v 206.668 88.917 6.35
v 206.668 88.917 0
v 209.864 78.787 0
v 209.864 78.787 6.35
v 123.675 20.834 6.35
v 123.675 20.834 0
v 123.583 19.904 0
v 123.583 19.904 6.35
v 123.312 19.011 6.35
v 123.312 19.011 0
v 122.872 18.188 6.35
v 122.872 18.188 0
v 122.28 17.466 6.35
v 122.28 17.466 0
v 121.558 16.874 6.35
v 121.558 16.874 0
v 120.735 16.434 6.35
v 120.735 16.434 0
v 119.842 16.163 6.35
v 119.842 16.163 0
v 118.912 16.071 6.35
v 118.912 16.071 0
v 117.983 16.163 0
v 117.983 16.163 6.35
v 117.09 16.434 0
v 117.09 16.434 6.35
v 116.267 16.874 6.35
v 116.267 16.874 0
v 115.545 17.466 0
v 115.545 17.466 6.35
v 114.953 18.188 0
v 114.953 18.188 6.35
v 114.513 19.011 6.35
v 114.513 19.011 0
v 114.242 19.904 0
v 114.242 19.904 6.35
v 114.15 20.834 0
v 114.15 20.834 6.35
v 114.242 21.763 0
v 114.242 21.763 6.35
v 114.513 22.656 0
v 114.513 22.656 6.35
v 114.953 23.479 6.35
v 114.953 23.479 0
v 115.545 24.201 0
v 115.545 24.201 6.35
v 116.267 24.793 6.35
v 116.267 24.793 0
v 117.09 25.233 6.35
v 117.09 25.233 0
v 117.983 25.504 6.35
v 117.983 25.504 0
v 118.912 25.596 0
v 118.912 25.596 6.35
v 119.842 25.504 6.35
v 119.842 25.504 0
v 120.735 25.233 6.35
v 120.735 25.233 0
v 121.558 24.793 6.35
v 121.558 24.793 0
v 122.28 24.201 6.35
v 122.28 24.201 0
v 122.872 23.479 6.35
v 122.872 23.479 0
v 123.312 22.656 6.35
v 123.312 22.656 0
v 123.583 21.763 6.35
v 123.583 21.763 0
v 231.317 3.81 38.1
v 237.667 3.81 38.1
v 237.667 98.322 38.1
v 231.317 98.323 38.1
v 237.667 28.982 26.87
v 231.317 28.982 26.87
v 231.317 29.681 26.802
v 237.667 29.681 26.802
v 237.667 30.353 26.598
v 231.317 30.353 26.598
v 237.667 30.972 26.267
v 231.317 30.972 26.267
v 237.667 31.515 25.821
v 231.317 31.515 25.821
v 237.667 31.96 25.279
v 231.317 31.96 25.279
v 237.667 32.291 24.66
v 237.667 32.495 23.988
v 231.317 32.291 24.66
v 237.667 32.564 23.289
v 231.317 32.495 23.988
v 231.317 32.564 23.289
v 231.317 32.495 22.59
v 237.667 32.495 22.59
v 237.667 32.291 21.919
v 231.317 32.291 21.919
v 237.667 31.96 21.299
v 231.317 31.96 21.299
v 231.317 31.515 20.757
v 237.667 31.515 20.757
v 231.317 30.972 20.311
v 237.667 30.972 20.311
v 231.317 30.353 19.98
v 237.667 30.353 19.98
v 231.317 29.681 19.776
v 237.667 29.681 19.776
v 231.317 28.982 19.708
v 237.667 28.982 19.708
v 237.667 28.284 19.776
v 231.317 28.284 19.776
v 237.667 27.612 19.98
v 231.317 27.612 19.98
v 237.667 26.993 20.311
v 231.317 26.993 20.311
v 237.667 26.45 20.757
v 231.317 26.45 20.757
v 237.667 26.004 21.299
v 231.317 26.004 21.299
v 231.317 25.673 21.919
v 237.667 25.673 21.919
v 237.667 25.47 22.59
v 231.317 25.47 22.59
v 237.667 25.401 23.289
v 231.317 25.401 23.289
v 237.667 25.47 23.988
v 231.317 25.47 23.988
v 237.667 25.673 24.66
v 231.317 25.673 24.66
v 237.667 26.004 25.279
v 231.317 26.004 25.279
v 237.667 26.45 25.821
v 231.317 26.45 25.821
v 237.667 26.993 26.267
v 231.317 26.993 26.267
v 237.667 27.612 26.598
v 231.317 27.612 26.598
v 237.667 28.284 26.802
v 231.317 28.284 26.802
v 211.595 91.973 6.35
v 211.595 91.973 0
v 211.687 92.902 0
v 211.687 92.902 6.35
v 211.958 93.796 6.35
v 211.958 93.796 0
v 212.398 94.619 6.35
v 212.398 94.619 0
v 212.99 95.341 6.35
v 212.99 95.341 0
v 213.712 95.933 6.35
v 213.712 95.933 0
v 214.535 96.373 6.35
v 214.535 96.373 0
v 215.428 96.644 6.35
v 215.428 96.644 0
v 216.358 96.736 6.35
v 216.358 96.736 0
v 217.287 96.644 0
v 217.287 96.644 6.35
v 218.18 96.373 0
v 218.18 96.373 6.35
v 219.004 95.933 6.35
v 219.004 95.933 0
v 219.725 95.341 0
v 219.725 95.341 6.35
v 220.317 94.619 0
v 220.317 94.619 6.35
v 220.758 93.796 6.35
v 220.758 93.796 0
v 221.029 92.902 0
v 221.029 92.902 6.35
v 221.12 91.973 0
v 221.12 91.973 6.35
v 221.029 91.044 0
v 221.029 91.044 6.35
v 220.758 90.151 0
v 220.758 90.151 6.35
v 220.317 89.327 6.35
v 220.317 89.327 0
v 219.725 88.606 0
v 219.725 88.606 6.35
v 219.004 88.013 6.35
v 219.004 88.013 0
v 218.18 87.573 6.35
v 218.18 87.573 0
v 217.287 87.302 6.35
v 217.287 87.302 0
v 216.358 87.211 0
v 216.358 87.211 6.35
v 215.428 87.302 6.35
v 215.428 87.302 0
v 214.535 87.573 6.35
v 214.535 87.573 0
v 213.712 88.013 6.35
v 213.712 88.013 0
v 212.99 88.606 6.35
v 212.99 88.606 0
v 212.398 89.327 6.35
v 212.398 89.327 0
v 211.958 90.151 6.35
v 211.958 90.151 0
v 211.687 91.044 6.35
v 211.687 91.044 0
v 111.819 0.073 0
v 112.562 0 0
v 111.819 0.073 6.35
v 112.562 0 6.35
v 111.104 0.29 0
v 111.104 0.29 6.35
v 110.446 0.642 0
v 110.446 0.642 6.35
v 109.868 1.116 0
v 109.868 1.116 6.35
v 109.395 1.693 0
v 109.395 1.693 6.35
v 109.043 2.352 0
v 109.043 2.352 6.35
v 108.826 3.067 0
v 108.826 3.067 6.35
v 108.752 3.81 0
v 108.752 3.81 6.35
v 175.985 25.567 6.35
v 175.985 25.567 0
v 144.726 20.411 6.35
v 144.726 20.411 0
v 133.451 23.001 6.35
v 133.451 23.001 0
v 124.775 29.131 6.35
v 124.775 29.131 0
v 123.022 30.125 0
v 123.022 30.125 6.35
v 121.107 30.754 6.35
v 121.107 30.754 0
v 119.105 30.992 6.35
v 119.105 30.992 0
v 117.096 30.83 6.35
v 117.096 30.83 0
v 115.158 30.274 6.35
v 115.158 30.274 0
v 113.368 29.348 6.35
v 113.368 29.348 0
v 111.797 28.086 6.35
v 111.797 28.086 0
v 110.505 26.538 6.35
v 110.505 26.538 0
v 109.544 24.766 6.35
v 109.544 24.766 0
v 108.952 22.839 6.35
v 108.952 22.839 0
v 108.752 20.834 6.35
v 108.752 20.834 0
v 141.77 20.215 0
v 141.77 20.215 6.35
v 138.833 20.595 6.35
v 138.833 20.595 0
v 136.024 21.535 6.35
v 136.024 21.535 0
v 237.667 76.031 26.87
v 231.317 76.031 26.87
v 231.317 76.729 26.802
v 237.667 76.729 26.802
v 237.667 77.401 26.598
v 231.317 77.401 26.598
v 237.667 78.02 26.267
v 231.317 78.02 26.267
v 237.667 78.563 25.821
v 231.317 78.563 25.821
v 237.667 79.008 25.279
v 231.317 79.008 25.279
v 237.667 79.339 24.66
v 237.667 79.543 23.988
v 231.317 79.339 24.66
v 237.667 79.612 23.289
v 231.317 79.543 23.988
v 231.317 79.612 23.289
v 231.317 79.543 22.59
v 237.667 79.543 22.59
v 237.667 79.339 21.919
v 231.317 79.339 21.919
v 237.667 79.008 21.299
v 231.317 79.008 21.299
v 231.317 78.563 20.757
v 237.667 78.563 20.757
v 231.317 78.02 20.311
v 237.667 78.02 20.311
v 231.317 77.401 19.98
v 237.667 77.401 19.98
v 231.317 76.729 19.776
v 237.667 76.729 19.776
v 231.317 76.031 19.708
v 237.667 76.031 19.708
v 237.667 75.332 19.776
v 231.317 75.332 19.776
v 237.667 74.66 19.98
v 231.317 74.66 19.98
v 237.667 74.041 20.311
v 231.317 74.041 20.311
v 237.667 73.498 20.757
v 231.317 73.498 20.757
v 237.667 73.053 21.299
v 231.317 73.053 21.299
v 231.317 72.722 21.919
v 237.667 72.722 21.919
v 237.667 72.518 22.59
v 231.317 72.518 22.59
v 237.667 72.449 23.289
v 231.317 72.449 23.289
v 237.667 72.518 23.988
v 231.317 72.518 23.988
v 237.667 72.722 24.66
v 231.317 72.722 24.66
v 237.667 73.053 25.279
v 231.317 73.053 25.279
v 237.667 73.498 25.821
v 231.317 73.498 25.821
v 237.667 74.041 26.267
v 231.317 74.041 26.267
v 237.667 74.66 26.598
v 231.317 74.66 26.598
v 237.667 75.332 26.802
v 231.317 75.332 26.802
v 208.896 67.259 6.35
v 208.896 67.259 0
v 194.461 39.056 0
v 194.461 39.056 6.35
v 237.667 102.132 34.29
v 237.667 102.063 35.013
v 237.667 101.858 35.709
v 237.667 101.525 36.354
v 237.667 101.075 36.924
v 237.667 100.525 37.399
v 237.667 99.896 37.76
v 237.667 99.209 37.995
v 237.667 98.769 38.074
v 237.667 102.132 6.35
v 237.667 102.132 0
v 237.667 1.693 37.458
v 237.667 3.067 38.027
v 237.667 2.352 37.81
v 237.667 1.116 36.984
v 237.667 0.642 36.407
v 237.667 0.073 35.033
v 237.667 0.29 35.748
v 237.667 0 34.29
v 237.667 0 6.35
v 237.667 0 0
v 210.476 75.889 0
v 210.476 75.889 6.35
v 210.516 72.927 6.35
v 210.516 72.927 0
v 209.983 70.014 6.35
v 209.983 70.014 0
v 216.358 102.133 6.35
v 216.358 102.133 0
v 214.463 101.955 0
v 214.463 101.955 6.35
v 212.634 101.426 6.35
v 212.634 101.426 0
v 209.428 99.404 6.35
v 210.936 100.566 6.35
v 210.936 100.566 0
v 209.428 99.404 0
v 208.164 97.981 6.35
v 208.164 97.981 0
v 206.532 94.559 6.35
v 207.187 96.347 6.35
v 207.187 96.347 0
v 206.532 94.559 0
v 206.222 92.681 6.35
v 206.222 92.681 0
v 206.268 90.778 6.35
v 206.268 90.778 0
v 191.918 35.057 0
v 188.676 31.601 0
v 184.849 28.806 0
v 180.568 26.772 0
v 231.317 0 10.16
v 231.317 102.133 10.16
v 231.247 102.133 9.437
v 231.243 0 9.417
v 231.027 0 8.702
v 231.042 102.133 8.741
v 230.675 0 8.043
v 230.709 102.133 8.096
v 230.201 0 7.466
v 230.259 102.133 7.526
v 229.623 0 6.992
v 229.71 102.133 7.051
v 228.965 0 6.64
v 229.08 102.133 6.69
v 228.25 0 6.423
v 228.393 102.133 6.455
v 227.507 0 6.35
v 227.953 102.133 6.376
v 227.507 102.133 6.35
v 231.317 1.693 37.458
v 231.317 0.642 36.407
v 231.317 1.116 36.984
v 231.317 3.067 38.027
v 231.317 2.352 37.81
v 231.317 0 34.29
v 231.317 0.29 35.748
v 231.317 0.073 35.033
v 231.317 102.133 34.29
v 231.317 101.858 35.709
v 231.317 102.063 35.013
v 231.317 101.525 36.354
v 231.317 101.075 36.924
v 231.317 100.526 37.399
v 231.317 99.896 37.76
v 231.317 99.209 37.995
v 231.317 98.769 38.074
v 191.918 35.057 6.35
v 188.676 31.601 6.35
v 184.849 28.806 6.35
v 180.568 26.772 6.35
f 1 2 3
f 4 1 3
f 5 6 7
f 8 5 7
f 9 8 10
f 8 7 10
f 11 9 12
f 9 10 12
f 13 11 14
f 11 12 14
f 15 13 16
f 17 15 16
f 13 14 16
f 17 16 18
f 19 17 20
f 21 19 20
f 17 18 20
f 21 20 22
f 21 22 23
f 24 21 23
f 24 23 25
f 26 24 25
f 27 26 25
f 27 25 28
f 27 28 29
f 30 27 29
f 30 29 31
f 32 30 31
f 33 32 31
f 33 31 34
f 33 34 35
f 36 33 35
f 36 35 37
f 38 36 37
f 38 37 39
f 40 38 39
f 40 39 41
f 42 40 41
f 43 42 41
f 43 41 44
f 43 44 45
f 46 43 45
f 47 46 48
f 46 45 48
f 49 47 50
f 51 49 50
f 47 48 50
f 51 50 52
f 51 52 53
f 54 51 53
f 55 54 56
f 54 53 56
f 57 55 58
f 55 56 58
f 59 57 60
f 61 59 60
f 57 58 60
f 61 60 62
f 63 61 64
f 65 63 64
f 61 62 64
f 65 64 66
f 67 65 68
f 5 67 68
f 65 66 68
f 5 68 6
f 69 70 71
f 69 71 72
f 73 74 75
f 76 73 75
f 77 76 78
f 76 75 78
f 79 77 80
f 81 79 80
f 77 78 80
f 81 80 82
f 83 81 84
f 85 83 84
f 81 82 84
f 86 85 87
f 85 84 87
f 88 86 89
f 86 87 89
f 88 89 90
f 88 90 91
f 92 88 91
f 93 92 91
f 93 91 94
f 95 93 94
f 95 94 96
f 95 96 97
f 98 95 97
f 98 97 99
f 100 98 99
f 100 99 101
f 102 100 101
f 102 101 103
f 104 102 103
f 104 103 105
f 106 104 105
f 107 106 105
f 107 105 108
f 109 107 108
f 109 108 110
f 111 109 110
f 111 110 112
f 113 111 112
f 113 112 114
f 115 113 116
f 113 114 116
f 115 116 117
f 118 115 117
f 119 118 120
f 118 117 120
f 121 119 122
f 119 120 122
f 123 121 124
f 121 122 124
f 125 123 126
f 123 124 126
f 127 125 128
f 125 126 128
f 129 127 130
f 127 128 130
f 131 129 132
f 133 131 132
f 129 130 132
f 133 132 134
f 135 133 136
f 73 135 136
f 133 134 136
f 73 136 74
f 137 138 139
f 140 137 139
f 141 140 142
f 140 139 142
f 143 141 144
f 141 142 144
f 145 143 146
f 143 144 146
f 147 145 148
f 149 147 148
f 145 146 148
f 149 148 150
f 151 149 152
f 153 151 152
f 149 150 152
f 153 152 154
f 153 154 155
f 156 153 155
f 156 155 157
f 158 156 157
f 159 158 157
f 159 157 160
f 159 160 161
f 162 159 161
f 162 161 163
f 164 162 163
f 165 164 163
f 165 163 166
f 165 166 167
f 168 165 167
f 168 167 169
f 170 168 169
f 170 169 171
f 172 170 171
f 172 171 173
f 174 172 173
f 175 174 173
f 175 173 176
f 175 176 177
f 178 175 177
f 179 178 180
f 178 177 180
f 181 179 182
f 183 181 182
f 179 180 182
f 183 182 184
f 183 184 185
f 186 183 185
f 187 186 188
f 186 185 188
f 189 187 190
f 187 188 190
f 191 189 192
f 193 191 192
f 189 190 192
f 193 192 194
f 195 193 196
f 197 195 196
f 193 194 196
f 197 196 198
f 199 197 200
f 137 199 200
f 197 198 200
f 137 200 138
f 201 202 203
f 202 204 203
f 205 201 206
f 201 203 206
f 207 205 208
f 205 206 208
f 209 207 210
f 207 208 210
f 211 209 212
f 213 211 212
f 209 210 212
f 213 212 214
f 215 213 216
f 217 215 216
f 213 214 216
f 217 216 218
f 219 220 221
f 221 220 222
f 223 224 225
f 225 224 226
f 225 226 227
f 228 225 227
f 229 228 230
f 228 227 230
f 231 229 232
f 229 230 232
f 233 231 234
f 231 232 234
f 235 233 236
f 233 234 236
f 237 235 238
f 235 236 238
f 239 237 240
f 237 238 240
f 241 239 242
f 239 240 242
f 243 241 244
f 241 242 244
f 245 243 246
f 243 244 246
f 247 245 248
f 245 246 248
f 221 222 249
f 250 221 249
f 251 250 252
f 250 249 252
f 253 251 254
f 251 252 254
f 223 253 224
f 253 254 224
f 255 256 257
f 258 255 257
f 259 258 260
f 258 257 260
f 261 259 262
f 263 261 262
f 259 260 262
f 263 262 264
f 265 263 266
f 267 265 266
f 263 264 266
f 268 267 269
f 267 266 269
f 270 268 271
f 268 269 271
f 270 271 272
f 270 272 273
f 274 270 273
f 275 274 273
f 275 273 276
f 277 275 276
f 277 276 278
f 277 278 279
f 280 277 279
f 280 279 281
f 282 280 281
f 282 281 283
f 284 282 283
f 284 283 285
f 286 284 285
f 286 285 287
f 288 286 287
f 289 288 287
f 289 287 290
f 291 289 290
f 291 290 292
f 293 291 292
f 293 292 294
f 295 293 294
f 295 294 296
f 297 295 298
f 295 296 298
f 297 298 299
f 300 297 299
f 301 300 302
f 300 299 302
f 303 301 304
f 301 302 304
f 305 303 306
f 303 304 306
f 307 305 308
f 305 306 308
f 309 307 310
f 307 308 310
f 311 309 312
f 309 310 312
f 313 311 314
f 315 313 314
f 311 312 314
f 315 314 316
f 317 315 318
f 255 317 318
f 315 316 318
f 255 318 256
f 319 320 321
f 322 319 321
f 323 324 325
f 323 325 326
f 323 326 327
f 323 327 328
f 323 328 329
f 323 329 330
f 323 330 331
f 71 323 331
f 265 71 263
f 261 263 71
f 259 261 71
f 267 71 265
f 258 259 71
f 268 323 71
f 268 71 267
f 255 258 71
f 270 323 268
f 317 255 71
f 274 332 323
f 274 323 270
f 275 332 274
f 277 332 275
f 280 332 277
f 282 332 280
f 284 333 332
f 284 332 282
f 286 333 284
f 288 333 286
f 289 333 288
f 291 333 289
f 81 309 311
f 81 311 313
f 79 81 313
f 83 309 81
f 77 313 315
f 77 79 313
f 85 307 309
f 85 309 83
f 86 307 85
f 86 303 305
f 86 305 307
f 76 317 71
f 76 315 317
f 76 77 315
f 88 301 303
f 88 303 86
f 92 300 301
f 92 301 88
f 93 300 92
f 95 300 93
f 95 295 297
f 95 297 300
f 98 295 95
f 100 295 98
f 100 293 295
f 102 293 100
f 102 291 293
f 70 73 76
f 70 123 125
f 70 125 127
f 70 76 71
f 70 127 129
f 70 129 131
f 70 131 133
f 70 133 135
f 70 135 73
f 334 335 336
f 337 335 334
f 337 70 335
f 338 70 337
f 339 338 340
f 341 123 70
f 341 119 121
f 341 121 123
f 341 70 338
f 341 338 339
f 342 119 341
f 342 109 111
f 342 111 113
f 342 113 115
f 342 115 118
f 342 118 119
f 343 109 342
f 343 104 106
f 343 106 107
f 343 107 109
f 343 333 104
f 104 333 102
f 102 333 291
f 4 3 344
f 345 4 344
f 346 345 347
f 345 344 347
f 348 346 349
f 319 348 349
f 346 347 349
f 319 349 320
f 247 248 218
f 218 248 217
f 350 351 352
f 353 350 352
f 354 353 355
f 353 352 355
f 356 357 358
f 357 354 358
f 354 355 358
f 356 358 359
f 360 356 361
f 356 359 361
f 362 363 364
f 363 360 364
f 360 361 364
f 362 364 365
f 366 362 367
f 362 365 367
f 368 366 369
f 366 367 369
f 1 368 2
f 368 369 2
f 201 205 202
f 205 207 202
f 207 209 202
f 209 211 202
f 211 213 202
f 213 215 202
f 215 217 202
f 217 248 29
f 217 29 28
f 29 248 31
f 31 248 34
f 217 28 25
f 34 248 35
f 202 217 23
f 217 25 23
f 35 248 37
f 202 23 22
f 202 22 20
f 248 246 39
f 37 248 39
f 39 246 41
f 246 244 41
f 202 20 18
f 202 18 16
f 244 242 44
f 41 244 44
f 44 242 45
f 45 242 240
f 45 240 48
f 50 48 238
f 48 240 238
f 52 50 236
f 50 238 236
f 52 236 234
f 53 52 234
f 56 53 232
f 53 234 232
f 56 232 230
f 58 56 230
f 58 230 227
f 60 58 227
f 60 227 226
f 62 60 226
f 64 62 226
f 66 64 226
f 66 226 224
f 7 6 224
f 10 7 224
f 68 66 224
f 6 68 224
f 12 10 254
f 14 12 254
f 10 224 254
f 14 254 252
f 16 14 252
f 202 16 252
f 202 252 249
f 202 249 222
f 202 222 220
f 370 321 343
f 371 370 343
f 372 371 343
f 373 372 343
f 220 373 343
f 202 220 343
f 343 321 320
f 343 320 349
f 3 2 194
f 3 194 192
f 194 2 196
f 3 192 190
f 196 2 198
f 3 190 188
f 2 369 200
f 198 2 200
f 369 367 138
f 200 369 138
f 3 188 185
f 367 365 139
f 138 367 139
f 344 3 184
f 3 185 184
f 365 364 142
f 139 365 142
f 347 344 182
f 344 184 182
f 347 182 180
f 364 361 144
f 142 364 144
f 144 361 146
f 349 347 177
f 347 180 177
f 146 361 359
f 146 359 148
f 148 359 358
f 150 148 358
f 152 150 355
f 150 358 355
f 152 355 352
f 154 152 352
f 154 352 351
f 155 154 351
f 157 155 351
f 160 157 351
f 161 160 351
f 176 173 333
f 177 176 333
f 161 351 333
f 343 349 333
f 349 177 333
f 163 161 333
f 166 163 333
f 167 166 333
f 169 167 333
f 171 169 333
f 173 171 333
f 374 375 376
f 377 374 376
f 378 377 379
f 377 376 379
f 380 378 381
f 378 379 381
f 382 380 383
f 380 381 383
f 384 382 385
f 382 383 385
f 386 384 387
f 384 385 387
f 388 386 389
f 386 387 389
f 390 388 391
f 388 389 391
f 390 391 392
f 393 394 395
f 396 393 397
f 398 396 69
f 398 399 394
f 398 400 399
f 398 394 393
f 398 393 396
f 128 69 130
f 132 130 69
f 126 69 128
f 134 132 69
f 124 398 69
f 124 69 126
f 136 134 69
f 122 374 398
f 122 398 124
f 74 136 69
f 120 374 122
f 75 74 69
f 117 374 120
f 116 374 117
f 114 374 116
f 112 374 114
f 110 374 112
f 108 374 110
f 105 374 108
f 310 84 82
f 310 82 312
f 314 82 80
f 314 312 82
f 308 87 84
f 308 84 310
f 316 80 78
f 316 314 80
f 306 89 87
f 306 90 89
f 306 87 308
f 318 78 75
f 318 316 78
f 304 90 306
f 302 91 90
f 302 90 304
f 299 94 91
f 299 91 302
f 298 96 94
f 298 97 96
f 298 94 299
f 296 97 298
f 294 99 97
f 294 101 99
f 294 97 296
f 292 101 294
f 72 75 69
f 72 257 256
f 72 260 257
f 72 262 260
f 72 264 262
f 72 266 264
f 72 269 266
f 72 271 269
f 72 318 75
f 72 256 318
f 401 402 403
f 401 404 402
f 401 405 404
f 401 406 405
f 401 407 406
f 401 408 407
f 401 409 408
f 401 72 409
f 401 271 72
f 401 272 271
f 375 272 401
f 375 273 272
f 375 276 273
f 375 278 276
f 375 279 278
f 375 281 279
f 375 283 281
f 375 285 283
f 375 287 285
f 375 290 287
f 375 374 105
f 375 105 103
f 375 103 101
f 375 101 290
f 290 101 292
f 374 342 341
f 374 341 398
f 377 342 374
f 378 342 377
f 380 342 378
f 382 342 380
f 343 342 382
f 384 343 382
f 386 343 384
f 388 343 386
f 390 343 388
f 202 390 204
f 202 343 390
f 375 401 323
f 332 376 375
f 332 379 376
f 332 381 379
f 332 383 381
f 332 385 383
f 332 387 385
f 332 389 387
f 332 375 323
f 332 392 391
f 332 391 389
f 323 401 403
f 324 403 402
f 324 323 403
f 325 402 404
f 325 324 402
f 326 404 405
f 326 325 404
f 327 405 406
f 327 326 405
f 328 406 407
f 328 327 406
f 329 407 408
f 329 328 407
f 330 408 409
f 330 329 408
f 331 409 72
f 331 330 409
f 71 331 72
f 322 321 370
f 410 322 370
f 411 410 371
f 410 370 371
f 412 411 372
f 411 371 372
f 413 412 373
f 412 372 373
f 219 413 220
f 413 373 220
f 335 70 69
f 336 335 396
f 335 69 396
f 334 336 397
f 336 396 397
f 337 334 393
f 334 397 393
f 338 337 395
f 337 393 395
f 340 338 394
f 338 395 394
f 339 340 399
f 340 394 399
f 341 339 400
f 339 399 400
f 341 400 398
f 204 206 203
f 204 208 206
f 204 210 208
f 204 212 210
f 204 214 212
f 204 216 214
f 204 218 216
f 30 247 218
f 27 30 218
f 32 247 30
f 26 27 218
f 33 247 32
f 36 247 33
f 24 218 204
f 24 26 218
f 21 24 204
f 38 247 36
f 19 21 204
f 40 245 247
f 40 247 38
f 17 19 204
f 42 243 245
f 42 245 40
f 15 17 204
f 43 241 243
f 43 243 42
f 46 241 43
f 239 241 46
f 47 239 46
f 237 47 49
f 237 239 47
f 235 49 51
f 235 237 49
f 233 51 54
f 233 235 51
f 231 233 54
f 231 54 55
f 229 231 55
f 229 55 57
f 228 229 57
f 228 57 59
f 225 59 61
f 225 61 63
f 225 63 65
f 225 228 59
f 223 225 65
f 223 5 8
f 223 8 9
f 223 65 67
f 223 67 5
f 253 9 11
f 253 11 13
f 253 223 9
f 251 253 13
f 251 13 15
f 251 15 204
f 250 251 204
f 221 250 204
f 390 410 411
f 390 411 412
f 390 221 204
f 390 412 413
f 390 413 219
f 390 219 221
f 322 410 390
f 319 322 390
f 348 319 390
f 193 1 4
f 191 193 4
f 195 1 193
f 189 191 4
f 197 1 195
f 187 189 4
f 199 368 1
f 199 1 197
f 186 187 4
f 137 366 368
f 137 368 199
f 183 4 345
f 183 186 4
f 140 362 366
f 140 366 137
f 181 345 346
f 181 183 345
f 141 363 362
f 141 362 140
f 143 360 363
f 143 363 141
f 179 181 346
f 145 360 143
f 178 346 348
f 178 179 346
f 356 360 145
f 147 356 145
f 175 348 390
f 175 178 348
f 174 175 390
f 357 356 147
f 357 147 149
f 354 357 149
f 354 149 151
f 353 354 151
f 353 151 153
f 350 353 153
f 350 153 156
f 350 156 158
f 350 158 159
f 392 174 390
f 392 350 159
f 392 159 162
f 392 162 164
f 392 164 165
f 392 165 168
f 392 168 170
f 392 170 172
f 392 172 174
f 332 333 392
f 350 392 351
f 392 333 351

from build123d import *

# Parameters (mm, degrees)
SKETCH1_W           = 237.666601654
SKETCH1_H           = 144.870829151
BOSS_EXTRUDE1_DEPTH = 6.35
SKETCH6_R           = 4.7625
CUT_EXTRUDE1_DEPTH  = 279.412092375
BOSS_EXTRUDE2_DEPTH = 31.75
SKETCH8_R           = 3.5814
CUT_EXTRUDE2_DEPTH  = 165.026783357
FILLET1_R           = 3.81


with BuildPart() as part:
    # Sketch1 → Boss-Extrude1 (new body)
    with BuildSketch(Plane.XY):
        with Locations((118.833300827, 72.435414576)):
            Rectangle(SKETCH1_W, SKETCH1_H)
    extrude(amount=BOSS_EXTRUDE1_DEPTH)

    # Sketch6 → Cut-Extrude1 (cut, through all)
    with BuildSketch(Plane(origin=(0, 0, 0), x_dir=(-1, 0, 0), z_dir=(0, 0, -1))):
        with Locations((-216.35760516, 91.973324775)):
            Circle(SKETCH6_R)
        with Locations(Location((-118.912497493, 20.833508274, 0), (0, 0, 180))):
            Circle(SKETCH6_R)
        with BuildLine():
            Line((-237.666601654, 102.132216913), (-216.358133389, 102.133324761))
            ThreePointArc((-216.358133389, 102.133324761), (-208.163913134, 97.980737777), (-206.668218378, 88.91695703))
            Line((-206.668218378, 88.91695703), (-209.863652574, 78.786697699))
            ThreePointArc((-209.863652574, 78.786697699), (-210.516155402, 72.927274811), (-208.895904566, 67.258643251))
            Line((-208.895904566, 67.258643251), (-194.461394125, 39.056254914))
            ThreePointArc((-194.461394125, 39.056254914), (-186.82764399, 30.114000126), (-175.984822796, 25.567431049))
            Line((-175.984822796, 25.567431049), (-144.725556293, 20.41107019))
            ThreePointArc((-144.725556293, 20.41107019), (-138.832778099, 20.5948137), (-133.450682209, 23.001396414))
            Line((-133.450682209, 23.001396414), (-124.775487304, 29.13115556))
            ThreePointArc((-124.775487304, 29.13115556), (-114.240366099, 29.855525136), (-108.752497493, 20.833508274))
            Line((-108.752497493, 20.833508274), (-108.752497493, 0))
            Line((-108.752497493, 0), (33.78855799, -29.414686869))
            Line((33.78855799, -29.414686869), (48.645656143, 190.527142522))
            Line((48.645656143, 190.527142522), (-347.111633803, 192.661310616))
            Line((-347.111633803, 192.661310616), (-237.666601654, 102.132216913))
        make_face()
    extrude(amount=-CUT_EXTRUDE1_DEPTH, mode=Mode.SUBTRACT)

    # Sketch7 → Boss-Extrude2 (add)
    with BuildSketch(Plane.XY.offset(6.35)):
        Polygon((231.316601654, 102.132547055), (237.666601654, 102.132216913), (237.666601654, 0), (231.316601654, 0), align=None)
    extrude(amount=BOSS_EXTRUDE2_DEPTH)

    # Sketch8 → Cut-Extrude2 (cut, through all)
    with BuildSketch(Plane.ZY.offset(-231.316601654)):
        with Locations((23.289062999, 76.03064494)):
            Circle(SKETCH8_R)
        with Locations((23.289062999, 28.982263142)):
            Circle(SKETCH8_R)
    extrude(amount=-CUT_EXTRUDE2_DEPTH, mode=Mode.SUBTRACT)

    # Fillet1
    fillet1_edges = [part.edges().sort_by_distance(p)[0] for p in [
        (108.752497493, 0, 3.175),
        (231.316601654, 51.066273528, 6.35),
        (234.491601654, 0, 38.1),
        (234.491601654, 102.132381984, 38.1),
    ]]
    fillet(fillet1_edges, radius=FILLET1_R)


solid = part.part
